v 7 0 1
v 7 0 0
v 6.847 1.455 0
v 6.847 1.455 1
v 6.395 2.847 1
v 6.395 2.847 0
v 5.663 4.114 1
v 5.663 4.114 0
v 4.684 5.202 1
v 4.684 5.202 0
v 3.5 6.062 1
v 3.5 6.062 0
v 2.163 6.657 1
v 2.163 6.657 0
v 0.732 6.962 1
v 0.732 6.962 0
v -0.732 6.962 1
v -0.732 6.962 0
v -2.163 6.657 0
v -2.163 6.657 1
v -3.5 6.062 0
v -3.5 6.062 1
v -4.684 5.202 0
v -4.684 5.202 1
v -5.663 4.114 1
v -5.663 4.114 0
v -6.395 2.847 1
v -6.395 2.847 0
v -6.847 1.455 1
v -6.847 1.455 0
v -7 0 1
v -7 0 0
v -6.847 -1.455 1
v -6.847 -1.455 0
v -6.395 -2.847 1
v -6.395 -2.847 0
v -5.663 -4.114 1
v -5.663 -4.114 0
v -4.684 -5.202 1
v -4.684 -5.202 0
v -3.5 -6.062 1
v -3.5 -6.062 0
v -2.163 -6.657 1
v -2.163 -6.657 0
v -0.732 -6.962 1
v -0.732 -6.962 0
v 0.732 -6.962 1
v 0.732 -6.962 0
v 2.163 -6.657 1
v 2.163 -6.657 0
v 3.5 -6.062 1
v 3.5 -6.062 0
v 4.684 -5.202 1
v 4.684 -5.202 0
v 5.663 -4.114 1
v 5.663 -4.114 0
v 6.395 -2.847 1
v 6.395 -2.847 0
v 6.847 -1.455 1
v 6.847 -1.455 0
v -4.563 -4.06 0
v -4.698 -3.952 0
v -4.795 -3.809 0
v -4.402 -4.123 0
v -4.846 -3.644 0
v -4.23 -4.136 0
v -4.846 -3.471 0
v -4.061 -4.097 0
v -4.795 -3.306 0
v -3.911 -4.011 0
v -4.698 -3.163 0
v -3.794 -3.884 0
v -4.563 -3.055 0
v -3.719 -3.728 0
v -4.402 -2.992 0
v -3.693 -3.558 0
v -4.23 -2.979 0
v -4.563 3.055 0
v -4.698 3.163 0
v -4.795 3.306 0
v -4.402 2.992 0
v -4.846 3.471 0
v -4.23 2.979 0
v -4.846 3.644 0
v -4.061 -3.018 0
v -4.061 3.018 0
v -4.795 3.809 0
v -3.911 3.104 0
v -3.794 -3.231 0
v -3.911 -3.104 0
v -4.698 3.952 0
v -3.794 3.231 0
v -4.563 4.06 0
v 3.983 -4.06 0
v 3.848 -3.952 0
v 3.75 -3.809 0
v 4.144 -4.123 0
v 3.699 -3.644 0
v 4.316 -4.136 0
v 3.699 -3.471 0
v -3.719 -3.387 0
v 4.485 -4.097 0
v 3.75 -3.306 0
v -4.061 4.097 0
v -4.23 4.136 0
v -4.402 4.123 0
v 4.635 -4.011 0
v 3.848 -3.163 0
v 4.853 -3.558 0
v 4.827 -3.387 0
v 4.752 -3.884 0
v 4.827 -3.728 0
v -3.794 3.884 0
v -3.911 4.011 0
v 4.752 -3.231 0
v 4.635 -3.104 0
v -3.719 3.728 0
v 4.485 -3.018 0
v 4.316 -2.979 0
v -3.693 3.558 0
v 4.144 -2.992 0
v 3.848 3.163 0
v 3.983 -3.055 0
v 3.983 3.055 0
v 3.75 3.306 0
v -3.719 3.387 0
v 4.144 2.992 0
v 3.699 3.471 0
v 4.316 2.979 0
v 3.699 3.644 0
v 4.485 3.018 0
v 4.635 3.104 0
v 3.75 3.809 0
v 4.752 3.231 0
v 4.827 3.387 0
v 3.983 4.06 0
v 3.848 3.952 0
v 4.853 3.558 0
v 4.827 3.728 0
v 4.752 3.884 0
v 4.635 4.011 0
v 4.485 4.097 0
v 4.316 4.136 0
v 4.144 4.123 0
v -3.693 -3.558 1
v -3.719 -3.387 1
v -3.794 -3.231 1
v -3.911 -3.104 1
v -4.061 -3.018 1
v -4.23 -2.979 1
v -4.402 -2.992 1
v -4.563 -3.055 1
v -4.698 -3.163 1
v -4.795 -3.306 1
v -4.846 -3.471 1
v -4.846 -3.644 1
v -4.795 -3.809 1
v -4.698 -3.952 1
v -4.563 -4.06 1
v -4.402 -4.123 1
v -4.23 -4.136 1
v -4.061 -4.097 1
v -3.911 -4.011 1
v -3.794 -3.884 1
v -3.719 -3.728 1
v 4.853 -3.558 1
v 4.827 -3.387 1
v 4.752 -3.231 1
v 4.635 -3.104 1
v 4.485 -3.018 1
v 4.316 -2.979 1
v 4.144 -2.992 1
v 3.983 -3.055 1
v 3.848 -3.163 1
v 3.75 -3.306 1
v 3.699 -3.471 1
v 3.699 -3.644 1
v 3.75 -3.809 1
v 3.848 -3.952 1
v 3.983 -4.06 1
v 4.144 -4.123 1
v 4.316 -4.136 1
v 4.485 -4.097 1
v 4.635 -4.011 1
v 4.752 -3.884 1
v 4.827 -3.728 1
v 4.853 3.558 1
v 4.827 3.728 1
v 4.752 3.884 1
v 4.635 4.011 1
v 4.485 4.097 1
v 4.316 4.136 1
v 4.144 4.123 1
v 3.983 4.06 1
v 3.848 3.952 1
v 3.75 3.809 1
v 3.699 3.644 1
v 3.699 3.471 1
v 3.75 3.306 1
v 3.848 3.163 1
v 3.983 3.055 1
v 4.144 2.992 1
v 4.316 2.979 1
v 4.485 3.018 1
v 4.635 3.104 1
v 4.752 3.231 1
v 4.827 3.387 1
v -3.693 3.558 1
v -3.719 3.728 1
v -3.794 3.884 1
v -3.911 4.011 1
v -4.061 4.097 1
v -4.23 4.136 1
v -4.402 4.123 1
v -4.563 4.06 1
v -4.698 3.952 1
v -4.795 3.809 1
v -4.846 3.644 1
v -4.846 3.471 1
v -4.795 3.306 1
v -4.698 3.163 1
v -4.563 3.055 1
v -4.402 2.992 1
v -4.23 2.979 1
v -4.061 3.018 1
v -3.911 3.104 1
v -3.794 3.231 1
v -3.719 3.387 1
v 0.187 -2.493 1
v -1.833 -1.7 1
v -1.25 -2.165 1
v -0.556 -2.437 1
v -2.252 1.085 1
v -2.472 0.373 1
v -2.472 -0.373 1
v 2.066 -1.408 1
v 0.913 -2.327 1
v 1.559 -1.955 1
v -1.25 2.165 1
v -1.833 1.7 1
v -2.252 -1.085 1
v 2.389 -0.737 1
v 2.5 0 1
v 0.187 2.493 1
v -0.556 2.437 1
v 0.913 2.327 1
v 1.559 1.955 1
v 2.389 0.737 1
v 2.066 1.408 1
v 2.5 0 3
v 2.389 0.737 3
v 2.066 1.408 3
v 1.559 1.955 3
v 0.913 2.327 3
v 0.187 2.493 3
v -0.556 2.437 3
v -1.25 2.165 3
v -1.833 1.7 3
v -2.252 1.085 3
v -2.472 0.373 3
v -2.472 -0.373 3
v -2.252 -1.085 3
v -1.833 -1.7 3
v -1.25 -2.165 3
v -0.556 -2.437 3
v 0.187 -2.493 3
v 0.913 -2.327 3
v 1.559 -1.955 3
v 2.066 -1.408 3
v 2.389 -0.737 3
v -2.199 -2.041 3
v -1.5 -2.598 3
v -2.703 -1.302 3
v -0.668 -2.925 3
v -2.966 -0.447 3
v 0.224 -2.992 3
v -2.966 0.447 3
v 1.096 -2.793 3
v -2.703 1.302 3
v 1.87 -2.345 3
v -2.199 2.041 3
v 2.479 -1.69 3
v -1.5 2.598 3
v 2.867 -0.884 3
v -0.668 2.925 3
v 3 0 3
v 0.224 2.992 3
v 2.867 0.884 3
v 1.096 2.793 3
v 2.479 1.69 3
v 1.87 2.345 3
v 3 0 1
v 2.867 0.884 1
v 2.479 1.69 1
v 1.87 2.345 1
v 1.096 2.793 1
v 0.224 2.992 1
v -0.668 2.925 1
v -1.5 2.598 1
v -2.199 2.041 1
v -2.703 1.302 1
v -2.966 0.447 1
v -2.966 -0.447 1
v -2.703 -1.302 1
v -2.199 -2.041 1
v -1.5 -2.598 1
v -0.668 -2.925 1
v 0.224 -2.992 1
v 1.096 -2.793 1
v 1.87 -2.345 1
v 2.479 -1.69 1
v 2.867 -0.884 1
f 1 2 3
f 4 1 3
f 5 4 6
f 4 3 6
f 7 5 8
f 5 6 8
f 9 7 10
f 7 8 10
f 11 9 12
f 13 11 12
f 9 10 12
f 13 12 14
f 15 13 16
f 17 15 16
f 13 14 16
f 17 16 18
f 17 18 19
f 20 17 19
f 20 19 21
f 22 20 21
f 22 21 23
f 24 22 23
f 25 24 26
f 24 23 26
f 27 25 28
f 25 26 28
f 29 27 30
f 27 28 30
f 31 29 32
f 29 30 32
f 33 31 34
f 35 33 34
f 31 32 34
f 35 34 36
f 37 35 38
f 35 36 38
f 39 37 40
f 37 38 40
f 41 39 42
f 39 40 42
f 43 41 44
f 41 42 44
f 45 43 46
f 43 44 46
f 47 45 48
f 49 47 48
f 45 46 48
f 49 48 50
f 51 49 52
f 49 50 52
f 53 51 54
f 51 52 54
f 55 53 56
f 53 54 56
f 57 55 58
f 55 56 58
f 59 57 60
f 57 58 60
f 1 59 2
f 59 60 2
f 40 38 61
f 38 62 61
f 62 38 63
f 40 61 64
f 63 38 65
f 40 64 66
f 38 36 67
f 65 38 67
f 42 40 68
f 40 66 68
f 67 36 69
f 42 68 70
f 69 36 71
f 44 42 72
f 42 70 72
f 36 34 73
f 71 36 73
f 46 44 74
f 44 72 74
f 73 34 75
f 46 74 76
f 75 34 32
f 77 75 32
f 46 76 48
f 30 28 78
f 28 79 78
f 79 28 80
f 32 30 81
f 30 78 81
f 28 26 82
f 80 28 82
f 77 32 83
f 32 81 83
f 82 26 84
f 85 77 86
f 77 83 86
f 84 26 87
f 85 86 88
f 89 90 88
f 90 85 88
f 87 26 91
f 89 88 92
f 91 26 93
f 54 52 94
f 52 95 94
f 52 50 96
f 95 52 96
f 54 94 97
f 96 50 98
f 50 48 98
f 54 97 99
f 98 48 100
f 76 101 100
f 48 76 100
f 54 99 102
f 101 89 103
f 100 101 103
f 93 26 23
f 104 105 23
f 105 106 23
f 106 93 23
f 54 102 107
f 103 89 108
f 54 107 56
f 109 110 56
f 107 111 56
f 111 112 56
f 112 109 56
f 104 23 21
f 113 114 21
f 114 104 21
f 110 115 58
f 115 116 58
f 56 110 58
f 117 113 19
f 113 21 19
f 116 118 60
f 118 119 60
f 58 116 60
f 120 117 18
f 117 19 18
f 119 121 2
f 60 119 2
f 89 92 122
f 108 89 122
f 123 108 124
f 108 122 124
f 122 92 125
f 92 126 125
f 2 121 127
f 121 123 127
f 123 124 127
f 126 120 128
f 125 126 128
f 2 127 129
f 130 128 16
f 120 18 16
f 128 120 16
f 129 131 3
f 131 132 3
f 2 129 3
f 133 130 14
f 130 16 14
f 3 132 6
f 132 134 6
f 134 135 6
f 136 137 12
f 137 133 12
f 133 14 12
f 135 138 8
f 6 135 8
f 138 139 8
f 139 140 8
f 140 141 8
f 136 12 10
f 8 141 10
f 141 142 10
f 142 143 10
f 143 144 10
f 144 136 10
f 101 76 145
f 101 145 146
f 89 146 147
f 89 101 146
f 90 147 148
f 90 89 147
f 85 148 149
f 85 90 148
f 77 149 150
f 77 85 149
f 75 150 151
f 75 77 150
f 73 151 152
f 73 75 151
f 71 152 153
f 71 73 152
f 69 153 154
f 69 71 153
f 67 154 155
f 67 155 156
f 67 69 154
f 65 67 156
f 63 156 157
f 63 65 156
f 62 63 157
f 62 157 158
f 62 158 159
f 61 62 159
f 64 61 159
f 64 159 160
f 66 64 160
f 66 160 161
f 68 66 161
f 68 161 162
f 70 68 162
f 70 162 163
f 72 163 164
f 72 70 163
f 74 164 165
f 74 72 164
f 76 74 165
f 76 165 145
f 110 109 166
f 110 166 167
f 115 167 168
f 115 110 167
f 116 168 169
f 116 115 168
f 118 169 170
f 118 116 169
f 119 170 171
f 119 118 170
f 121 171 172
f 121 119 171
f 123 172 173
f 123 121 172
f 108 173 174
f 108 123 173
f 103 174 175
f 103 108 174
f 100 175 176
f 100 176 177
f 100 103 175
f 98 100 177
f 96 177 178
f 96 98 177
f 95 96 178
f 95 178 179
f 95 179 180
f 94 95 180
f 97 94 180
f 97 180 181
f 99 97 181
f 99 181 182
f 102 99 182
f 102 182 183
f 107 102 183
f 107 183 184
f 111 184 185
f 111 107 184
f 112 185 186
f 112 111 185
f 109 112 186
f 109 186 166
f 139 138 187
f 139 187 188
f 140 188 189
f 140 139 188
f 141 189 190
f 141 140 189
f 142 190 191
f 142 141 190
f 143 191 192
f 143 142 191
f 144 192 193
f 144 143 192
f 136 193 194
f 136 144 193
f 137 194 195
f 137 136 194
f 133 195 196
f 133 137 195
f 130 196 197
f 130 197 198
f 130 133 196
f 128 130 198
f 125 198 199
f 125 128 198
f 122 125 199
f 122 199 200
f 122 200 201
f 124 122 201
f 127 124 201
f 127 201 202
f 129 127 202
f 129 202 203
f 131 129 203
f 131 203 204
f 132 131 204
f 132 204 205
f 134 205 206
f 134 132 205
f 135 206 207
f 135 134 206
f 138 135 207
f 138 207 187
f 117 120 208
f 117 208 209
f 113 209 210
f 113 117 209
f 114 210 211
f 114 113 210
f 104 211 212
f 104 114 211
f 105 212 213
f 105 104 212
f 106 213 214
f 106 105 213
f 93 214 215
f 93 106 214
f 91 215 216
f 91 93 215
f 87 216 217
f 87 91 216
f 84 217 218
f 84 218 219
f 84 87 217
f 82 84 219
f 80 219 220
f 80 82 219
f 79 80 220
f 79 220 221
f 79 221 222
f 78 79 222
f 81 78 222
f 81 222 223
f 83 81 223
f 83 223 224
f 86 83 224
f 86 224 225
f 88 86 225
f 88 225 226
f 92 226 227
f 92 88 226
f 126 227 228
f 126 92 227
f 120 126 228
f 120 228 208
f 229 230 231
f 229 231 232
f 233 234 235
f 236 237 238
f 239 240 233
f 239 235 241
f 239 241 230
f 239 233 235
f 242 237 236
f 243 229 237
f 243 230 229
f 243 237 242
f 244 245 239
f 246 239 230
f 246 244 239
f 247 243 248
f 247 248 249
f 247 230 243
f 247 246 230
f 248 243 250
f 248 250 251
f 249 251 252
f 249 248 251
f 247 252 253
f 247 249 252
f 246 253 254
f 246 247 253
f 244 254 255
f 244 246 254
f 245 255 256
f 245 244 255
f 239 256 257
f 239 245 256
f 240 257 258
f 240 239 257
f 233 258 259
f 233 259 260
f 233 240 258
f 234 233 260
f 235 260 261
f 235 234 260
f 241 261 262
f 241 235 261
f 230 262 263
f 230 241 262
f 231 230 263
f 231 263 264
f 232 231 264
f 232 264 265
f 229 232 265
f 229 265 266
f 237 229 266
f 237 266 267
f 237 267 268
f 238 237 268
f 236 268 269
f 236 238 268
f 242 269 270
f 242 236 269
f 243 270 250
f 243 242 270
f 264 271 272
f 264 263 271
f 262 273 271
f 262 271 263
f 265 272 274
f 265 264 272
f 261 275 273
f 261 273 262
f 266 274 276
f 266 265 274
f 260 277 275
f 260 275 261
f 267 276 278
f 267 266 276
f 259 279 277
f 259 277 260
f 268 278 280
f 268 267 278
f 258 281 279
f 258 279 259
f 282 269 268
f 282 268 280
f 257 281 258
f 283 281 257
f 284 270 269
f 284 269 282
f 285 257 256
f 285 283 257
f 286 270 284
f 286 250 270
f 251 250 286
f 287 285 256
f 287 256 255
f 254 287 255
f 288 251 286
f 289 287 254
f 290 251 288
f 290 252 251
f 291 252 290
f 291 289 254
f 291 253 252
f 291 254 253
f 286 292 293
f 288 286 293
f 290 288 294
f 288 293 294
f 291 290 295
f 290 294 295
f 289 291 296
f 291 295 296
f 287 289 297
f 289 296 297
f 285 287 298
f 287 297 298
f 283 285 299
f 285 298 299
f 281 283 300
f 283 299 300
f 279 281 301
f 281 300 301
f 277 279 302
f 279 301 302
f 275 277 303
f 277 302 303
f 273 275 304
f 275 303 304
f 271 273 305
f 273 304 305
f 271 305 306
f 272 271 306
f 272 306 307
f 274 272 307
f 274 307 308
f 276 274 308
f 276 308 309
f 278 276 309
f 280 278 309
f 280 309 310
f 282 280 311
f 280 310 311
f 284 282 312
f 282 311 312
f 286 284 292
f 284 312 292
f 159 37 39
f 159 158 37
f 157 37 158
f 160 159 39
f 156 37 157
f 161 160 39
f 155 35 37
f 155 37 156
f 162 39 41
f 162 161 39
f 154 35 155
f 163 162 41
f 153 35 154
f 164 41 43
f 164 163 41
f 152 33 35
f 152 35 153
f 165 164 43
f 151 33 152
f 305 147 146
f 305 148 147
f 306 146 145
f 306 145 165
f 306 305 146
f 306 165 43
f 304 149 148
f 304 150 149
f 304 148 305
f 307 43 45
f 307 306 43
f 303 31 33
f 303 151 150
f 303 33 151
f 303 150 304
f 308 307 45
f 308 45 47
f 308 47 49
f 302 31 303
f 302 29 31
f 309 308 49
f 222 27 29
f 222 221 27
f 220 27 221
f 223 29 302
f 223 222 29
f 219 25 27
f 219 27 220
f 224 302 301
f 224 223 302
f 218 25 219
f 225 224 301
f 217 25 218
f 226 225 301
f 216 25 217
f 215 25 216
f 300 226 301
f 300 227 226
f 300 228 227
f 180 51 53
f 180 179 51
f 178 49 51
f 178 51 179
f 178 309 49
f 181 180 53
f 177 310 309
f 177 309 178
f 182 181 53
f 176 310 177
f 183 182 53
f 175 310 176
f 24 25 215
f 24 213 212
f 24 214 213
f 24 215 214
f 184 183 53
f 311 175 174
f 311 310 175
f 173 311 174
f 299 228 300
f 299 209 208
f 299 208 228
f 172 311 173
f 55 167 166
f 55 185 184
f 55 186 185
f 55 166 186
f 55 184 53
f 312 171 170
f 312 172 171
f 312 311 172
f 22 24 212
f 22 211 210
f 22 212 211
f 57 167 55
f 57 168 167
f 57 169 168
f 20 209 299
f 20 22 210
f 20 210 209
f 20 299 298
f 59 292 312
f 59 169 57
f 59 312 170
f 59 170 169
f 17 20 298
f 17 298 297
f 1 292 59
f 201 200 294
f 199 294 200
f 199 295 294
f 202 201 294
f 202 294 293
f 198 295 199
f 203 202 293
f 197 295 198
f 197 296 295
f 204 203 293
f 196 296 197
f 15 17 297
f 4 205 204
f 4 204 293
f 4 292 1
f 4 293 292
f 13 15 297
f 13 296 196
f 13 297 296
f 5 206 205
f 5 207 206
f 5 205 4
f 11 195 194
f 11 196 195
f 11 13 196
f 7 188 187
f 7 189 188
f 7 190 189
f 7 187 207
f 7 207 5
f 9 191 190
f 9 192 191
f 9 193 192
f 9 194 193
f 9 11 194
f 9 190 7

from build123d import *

# Parameters (mm, degrees)
SKETCH2_R           = 7
SKETCH2_R_2         = 0.58
BOSS_EXTRUDE1_DEPTH = 1
SKETCH3_R           = 3
SKETCH3_R_2         = 2.5
EXTRUDE_THIN1_DEPTH = 2


with BuildPart() as part:
    # Sketch2 → Boss-Extrude1 (new body)
    with BuildSketch(Plane.XY):
        Circle(SKETCH2_R)
        with Locations((4.27289846, 3.557518623)):
            Circle(SKETCH2_R_2, mode=Mode.SUBTRACT)
        with Locations((-4.27289846, 3.557518623)):
            Circle(SKETCH2_R_2, mode=Mode.SUBTRACT)
        with Locations((4.27289846, -3.557518623)):
            Circle(SKETCH2_R_2, mode=Mode.SUBTRACT)
        with Locations((-4.27289846, -3.557518623)):
            Circle(SKETCH2_R_2, mode=Mode.SUBTRACT)
    extrude(amount=BOSS_EXTRUDE1_DEPTH)

    # Sketch3 → Extrude-Thin1 (add)
    with BuildSketch(Plane.XY.offset(1)):
        Circle(SKETCH3_R)
        Circle(SKETCH3_R_2, mode=Mode.SUBTRACT)
    extrude(amount=EXTRUDE_THIN1_DEPTH)


solid = part.part
